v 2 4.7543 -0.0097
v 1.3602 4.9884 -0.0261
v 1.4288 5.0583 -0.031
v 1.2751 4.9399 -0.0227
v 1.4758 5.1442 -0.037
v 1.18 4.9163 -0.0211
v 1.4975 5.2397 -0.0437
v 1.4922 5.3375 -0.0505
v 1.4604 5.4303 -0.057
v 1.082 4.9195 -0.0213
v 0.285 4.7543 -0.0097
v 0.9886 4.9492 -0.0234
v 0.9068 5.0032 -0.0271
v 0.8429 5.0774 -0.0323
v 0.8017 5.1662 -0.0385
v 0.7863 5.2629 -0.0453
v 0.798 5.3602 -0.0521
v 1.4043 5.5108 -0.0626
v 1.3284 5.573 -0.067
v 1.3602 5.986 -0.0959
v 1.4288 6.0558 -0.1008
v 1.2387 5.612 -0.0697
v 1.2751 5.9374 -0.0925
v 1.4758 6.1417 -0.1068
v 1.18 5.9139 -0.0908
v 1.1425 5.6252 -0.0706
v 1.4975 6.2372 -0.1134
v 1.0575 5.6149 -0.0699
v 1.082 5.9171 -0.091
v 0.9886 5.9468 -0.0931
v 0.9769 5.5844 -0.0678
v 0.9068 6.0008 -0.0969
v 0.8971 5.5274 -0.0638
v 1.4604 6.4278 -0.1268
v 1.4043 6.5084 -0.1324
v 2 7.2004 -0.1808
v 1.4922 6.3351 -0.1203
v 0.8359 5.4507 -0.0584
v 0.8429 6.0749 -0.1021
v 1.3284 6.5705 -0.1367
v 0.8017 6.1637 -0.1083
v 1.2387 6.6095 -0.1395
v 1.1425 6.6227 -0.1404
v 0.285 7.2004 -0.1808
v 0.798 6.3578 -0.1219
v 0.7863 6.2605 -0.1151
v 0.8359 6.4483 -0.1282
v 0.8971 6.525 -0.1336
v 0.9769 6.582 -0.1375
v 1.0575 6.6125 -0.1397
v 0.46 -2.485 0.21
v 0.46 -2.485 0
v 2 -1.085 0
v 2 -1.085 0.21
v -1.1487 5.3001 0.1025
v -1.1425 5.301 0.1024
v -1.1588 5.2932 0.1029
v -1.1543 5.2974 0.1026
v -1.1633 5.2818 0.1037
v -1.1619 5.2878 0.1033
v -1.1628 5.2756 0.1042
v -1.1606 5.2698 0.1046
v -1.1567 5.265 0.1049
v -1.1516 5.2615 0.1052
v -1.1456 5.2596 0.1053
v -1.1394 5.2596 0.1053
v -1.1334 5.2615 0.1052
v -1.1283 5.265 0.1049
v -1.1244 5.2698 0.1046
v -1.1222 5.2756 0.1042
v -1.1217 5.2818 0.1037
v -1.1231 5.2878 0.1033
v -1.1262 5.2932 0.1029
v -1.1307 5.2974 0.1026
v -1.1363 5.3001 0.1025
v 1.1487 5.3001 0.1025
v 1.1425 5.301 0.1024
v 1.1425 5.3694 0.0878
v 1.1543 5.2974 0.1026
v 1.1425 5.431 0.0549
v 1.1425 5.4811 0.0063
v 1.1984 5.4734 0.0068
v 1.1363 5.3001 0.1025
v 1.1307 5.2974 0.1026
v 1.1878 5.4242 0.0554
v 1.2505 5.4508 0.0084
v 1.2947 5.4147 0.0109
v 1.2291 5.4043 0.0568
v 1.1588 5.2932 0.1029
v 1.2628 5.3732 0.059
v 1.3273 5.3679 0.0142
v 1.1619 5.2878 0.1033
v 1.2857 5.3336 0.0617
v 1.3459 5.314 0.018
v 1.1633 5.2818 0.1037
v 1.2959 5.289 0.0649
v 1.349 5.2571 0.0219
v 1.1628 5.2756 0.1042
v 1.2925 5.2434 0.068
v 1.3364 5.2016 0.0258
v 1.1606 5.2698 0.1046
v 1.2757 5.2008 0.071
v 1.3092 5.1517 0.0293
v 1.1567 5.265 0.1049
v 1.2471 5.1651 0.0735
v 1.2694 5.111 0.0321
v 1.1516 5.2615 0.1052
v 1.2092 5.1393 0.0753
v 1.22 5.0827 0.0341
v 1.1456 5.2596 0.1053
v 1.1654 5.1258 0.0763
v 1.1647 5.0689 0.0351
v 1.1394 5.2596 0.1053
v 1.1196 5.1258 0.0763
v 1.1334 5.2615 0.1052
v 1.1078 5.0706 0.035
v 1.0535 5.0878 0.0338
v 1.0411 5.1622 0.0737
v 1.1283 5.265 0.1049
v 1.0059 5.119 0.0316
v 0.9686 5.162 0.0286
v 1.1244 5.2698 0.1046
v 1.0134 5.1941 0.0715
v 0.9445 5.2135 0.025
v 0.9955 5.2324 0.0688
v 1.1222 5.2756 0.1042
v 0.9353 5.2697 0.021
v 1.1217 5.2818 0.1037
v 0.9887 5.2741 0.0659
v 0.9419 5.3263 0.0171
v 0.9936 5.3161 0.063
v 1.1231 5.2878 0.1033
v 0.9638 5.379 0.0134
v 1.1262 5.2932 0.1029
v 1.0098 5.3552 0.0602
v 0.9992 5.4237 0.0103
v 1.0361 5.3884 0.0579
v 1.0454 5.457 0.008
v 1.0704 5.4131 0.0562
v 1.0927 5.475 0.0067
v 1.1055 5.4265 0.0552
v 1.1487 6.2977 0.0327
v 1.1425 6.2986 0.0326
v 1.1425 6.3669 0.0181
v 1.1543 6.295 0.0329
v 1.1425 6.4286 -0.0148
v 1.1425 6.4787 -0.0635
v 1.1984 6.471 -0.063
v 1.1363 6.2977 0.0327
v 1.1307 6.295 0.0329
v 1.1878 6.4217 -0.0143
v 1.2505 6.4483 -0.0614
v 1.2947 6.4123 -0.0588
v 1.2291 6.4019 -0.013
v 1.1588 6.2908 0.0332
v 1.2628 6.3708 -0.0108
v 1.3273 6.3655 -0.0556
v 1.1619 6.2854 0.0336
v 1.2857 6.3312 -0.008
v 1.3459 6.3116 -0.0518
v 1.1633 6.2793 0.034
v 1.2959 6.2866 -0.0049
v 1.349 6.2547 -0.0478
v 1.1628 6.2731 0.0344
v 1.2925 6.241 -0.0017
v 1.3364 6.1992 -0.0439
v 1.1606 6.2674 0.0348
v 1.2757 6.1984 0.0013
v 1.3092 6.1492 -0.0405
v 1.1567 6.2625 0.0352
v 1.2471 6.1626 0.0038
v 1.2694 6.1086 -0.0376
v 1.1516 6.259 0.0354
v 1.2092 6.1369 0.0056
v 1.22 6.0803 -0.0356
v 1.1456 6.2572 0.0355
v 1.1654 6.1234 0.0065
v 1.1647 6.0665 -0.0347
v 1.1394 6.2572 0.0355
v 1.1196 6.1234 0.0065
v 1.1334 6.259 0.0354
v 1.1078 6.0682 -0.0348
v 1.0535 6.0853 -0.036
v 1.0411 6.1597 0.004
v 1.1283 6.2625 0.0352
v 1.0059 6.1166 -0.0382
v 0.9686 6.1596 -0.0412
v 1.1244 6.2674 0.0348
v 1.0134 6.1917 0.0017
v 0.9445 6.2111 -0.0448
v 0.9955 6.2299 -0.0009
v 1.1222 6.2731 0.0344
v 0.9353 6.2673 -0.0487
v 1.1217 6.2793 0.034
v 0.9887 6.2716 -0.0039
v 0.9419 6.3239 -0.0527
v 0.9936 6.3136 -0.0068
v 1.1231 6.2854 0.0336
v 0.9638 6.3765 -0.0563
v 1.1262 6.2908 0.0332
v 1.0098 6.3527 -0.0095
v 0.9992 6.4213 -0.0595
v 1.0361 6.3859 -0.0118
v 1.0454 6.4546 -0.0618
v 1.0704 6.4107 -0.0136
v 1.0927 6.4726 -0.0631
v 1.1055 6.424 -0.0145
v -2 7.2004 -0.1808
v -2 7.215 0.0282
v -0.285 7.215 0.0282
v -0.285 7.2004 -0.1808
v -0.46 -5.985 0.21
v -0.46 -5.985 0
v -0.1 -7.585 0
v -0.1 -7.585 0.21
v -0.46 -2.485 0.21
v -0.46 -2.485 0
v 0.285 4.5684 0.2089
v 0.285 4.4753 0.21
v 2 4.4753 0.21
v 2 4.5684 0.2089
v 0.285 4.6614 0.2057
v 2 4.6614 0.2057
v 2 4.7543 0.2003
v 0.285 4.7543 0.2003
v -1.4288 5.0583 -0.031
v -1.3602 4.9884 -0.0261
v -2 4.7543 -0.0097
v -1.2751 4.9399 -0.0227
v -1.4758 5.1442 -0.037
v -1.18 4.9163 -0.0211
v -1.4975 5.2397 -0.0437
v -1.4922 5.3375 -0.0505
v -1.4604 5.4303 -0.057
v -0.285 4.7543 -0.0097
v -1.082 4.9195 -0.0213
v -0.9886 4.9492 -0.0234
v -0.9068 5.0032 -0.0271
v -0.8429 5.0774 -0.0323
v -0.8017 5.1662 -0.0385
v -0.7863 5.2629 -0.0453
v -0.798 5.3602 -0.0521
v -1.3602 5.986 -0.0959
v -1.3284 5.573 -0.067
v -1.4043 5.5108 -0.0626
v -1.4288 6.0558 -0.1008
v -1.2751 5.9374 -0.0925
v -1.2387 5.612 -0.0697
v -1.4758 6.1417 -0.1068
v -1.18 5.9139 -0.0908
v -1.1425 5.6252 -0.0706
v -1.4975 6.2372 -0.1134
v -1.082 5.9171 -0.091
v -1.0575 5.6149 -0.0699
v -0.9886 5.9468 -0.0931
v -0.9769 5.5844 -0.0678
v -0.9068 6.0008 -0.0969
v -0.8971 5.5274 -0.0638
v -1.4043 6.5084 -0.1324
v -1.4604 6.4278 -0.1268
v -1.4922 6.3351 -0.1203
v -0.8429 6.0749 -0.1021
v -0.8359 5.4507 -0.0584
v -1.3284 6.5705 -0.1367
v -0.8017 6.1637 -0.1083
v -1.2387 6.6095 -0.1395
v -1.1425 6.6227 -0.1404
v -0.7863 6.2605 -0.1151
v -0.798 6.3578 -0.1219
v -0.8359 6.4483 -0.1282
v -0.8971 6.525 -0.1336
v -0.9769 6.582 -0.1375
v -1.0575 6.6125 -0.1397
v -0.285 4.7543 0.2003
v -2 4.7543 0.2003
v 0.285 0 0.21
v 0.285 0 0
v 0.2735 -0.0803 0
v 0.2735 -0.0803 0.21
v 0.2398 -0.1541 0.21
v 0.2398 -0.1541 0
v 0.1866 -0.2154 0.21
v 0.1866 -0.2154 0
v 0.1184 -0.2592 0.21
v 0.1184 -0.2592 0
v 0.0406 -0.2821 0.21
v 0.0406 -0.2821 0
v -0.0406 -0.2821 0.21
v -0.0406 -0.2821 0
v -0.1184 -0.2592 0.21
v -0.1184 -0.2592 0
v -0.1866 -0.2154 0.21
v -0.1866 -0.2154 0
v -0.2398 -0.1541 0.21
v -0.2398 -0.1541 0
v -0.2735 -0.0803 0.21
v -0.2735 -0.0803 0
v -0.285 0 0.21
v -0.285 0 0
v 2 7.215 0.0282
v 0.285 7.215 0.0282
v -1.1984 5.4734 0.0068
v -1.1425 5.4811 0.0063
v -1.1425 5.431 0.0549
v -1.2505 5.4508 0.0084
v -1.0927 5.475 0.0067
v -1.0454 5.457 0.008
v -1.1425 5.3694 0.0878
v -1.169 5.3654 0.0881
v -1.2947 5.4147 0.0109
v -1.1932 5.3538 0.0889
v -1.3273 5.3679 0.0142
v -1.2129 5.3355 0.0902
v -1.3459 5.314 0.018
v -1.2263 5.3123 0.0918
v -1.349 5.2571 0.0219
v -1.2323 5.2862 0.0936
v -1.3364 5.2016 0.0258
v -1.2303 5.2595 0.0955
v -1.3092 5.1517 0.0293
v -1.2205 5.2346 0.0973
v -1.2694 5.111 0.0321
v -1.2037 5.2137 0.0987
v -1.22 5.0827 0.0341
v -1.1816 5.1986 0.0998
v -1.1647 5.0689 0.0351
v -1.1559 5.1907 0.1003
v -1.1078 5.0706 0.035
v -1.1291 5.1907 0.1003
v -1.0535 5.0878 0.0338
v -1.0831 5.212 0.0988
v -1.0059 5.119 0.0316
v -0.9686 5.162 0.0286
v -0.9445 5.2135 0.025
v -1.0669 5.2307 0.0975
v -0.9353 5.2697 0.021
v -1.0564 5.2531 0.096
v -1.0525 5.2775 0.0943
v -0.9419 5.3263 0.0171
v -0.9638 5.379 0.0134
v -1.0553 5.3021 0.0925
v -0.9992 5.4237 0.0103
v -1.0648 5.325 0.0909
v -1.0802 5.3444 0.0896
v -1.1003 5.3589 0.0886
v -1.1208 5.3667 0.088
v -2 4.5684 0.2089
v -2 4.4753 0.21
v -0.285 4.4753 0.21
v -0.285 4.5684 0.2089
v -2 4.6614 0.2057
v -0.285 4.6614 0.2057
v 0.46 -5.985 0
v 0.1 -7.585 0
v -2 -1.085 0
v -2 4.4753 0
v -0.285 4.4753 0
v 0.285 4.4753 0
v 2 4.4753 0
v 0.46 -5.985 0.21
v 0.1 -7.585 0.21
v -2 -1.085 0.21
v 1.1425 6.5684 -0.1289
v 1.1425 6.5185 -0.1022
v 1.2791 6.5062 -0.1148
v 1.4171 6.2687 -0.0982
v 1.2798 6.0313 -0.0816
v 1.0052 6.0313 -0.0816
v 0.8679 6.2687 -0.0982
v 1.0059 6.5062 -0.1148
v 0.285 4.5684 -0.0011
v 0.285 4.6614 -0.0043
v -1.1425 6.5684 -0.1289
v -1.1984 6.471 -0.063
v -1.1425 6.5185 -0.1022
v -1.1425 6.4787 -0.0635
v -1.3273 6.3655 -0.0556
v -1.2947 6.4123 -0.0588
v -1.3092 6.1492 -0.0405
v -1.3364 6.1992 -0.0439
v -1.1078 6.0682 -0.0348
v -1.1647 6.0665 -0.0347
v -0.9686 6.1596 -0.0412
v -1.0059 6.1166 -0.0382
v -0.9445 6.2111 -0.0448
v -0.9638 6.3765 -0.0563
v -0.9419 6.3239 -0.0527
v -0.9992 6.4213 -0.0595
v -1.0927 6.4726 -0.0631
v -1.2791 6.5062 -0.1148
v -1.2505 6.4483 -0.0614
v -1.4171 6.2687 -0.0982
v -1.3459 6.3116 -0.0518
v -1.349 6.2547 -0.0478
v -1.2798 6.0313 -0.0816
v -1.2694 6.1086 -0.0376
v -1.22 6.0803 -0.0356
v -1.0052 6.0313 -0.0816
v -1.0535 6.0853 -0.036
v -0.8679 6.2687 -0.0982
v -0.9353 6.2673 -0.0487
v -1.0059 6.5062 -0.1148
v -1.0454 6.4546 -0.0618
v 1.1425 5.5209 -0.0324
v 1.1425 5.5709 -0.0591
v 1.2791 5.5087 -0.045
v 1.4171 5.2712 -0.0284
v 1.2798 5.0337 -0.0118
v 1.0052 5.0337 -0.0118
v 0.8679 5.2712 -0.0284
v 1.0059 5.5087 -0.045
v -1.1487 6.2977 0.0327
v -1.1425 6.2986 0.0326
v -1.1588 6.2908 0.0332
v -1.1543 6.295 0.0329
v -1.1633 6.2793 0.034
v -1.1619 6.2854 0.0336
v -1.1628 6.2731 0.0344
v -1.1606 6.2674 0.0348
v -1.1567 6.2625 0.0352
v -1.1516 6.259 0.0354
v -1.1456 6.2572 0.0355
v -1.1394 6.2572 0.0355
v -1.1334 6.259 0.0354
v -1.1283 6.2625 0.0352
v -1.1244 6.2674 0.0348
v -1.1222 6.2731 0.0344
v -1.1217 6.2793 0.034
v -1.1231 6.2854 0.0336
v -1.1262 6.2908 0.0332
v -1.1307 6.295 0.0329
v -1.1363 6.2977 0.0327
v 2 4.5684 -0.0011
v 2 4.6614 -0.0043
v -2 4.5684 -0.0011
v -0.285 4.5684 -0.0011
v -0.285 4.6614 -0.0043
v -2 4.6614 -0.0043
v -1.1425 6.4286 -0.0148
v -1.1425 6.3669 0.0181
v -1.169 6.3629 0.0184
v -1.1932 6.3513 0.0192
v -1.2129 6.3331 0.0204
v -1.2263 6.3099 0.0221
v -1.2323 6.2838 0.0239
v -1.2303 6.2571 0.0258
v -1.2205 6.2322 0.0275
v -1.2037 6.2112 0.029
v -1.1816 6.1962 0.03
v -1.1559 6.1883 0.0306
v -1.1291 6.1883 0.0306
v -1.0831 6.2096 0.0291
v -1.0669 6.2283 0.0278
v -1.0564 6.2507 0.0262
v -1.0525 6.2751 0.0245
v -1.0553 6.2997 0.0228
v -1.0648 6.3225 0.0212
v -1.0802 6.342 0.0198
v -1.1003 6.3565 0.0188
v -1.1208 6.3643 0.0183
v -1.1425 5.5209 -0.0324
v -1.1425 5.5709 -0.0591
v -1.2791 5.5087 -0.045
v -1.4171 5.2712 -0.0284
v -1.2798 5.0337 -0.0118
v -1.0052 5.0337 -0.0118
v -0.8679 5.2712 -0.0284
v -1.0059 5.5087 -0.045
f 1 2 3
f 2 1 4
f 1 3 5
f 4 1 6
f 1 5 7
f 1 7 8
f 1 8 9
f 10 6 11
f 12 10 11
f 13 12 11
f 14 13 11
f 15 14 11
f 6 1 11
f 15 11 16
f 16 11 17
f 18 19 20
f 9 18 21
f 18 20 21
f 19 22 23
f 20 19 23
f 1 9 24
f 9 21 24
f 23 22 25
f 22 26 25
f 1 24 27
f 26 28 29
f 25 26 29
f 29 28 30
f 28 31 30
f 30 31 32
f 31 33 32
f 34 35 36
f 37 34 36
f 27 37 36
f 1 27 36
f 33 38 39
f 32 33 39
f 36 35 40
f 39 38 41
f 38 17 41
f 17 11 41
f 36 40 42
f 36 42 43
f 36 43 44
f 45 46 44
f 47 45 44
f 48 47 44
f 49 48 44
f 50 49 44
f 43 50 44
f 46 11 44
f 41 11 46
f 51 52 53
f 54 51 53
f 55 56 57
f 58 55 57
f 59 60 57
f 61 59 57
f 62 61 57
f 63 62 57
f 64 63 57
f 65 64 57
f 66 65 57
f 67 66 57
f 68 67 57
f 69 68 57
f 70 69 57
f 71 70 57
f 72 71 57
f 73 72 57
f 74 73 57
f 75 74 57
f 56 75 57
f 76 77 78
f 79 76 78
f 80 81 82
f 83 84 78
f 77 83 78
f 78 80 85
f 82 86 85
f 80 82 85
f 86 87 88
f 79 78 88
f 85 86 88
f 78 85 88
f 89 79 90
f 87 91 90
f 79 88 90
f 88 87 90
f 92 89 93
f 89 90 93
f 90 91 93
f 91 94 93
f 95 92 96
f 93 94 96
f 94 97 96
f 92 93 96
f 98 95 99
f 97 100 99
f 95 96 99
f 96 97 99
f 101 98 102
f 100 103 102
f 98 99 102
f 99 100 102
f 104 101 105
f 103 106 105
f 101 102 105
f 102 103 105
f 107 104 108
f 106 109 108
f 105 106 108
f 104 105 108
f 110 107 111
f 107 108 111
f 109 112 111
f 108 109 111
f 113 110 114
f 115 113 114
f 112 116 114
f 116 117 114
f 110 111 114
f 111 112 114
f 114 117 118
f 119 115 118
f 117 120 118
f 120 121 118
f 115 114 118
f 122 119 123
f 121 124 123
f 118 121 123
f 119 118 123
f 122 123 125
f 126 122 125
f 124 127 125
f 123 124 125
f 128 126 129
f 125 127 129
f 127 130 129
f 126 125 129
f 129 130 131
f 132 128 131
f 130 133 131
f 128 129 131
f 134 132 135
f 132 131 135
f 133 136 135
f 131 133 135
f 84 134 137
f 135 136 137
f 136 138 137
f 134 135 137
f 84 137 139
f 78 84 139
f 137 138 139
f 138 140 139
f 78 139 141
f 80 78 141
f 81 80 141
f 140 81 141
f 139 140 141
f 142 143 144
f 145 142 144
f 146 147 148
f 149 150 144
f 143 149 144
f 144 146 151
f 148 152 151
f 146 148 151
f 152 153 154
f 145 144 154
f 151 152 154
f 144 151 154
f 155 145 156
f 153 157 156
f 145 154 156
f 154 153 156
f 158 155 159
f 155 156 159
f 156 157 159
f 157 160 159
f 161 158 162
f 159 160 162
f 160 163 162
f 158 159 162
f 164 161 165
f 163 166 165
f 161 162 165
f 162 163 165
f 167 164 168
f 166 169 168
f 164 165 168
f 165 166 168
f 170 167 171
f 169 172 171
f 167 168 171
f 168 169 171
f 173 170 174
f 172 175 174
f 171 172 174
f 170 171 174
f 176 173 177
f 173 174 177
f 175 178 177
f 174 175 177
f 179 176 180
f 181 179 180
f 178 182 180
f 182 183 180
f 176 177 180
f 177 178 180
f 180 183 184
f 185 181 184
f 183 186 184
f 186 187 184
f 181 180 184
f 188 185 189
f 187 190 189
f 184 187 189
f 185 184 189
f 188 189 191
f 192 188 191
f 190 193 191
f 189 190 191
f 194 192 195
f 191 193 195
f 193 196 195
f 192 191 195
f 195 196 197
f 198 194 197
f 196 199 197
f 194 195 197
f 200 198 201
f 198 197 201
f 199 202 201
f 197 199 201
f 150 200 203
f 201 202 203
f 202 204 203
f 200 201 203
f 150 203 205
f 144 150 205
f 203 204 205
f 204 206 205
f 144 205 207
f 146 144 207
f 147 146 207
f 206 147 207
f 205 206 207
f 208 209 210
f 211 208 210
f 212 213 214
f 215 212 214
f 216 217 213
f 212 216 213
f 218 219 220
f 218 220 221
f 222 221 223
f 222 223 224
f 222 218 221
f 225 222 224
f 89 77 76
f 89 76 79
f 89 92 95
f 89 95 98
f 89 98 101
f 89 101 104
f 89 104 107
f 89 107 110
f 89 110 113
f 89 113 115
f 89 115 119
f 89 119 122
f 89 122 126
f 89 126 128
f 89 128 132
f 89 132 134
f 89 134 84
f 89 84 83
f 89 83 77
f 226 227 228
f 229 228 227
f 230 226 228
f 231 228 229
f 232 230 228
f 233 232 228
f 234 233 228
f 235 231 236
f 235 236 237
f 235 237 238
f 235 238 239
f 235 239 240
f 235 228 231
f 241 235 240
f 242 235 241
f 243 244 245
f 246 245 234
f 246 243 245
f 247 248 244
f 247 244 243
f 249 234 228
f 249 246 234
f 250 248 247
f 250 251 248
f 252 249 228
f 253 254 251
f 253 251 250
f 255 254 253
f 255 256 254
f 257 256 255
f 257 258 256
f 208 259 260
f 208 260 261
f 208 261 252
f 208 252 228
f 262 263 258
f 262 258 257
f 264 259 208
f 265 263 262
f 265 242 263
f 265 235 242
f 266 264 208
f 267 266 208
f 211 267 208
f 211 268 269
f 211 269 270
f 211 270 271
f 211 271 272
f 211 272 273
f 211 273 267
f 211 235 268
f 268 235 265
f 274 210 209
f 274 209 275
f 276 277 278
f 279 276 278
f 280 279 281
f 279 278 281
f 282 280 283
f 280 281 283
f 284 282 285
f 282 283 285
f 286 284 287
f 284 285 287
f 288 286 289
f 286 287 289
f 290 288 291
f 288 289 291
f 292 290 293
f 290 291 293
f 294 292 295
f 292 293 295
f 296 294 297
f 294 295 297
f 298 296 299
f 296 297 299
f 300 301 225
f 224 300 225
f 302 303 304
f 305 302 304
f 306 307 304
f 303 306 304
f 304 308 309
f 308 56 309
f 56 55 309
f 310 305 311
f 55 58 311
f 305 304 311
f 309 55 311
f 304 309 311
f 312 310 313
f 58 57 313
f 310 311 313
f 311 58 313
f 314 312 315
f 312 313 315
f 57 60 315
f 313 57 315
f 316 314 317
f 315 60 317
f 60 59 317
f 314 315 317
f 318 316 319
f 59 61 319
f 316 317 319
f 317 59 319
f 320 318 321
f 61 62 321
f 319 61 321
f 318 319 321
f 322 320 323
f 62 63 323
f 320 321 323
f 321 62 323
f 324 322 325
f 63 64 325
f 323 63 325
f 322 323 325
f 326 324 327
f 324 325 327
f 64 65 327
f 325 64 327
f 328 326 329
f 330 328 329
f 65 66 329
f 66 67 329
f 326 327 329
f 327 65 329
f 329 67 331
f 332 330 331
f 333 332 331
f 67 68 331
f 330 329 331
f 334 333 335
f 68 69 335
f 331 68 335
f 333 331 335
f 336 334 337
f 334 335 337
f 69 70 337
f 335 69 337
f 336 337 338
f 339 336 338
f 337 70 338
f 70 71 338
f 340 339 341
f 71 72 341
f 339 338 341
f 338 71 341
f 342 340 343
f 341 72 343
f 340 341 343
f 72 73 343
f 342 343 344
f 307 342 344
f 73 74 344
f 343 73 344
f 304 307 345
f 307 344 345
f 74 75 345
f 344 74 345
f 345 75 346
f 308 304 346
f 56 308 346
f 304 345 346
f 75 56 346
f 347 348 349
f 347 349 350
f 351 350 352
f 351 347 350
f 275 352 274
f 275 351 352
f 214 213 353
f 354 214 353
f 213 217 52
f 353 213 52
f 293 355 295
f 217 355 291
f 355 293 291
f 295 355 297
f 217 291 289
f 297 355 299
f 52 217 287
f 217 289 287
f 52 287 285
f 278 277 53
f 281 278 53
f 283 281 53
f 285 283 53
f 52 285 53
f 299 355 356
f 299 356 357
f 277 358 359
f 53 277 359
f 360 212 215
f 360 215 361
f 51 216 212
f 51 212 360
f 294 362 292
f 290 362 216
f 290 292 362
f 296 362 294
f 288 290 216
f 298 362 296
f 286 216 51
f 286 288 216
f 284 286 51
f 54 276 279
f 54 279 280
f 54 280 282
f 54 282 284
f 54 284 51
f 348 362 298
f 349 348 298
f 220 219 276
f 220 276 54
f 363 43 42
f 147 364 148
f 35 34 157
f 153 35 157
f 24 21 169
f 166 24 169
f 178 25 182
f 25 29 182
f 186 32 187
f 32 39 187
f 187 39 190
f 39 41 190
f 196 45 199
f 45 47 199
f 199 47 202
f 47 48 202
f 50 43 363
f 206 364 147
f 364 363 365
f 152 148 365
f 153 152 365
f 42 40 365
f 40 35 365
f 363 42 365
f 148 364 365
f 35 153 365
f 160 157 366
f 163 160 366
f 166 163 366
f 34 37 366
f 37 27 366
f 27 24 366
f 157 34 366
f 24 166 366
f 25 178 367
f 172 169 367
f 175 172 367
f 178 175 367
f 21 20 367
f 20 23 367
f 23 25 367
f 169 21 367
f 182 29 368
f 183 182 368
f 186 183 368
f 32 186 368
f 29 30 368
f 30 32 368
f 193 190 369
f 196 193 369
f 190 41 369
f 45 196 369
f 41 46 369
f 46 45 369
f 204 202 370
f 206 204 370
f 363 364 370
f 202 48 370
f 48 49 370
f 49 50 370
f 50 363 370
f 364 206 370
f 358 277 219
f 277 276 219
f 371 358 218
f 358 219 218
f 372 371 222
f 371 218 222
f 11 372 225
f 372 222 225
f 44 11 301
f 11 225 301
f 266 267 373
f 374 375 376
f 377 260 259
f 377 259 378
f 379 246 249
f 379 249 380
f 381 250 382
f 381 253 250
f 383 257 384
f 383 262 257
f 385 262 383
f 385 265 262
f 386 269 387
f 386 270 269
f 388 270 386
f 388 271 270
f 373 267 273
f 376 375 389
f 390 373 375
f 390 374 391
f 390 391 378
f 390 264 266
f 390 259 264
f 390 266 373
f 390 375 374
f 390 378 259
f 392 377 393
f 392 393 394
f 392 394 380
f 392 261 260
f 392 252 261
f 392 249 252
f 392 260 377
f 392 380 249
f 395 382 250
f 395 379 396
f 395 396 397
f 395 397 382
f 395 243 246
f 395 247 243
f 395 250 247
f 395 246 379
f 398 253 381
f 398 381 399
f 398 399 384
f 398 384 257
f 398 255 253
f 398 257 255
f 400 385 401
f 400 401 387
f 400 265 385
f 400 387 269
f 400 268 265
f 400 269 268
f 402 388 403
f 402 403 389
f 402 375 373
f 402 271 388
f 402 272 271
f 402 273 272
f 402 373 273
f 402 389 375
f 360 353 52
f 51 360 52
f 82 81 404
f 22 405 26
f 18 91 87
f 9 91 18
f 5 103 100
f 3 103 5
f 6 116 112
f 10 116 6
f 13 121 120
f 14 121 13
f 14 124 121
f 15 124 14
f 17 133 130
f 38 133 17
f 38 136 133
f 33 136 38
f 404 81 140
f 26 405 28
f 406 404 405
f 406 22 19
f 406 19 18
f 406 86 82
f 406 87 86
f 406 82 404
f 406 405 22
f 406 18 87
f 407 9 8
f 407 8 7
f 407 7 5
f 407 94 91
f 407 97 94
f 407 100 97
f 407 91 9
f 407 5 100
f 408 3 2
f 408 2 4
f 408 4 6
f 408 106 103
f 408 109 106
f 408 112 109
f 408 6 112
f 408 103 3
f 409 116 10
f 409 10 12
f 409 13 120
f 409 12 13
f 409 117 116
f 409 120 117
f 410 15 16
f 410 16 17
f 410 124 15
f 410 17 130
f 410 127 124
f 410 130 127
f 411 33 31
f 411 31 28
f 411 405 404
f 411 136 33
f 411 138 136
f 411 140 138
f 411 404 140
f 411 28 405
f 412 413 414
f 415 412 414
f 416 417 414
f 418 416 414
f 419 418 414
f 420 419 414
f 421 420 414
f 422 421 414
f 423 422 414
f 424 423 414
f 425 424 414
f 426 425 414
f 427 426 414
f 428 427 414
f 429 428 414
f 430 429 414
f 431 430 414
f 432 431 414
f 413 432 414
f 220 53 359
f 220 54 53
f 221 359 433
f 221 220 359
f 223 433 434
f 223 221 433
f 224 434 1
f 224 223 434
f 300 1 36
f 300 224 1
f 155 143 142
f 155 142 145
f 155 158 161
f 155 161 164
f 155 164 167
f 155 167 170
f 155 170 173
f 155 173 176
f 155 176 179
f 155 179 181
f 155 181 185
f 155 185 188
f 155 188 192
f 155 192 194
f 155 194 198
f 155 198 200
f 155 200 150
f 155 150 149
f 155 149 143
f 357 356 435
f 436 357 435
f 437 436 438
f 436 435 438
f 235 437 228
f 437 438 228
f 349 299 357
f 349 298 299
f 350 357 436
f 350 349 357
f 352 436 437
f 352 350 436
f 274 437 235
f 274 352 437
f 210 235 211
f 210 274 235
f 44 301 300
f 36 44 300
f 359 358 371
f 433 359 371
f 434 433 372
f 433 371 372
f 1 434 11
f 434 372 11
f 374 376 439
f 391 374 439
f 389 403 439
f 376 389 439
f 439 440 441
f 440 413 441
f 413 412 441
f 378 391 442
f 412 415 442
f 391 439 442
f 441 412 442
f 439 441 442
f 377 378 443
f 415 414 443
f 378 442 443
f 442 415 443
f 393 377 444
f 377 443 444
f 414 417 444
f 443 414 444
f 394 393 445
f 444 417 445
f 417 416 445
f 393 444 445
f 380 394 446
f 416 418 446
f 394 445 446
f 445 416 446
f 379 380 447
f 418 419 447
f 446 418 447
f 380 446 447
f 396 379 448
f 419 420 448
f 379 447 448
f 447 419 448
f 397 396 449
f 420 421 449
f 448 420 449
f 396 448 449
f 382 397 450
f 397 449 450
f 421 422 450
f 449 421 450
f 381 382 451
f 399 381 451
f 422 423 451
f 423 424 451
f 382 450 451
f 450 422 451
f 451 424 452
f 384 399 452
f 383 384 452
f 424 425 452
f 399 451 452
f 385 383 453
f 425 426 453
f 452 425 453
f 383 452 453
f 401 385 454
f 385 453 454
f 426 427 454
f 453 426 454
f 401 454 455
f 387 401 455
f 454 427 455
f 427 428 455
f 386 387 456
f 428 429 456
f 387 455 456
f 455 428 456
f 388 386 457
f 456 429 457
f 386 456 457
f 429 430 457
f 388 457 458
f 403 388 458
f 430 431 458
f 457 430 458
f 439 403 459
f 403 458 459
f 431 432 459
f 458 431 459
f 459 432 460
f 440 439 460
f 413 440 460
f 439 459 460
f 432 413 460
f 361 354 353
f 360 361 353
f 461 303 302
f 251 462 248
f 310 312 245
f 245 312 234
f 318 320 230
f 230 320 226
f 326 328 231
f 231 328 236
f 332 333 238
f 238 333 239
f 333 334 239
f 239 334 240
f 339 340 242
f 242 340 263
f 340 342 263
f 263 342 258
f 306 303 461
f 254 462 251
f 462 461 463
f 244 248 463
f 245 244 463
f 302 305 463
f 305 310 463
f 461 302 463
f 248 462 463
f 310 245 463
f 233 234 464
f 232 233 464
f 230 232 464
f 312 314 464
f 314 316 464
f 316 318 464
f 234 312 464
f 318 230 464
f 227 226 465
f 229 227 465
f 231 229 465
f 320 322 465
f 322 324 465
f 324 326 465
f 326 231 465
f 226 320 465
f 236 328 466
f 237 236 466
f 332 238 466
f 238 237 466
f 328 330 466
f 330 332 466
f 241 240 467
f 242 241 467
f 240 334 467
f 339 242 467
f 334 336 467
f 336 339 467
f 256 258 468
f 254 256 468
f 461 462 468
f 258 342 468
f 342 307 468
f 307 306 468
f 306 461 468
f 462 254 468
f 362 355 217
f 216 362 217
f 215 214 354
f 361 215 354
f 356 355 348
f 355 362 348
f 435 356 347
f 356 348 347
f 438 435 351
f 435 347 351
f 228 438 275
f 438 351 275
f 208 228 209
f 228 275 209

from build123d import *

# Parameters (mm, degrees)
BOSS_EXTRUDE1_DEPTH  = 0.21
SKETCH2_W            = 4
SKETCH2_H            = 0.21
CUT_EXTRUDE1_DEPTH   = 2.6
SWEEP1_START         = 0.285
SWEEP1_DEPTH         = 1.715
FILLET1_START        = -3
FILLET1_DEPTH        = 6
FILLET1_START_2      = -2
FILLET1_2_DEPTH      = 1.715
FILLET1_START_3      = 0.285
FILLET1_3_DEPTH      = 1.715
SKETCH4_R            = 0.25
CUT_EXTRUDE2_DEPTH   = 0.15
FILLET2_R            = 0.25
FILLET3_R            = 0.2
FILLET2_OF_MIRROR4_R = 0.25
FILLET3_OF_MIRROR4_R = 0.2
SKETCH6_W            = 4
SKETCH6_H            = 0.209488451
CUT_EXTRUDE5_DEPTH   = 15.914789915


with BuildPart() as part:
    # Sketch1 → Boss-Extrude1 (new body)
    with BuildSketch(Plane.XY):
        with BuildLine():
            Line((-0.285, 7.215), (-2, 7.215))
            Line((-2, 7.215), (-2, -1.085))
            Line((-2, -1.085), (-0.46, -2.485))
            Line((-0.46, -2.485), (-0.46, -5.985))
            Line((-0.46, -5.985), (-0.1, -7.585))
            Line((-0.1, -7.585), (0.1, -7.585))
            Line((0.1, -7.585), (0.46, -5.985))
            Line((0.46, -5.985), (0.46, -2.485))
            Line((0.46, -2.485), (2, -1.085))
            Line((2, -1.085), (2, 7.215))
            Line((2, 7.215), (0.285, 7.215))
            Line((0.285, 7.215), (0.285, 0))
            ThreePointArc((0.285, 0), (0, -0.285), (-0.285, 0))
            Line((-0.285, 0), (-0.285, 7.215))
        make_face()
    extrude(amount=BOSS_EXTRUDE1_DEPTH)

    # Sketch2 → Cut-Extrude1 (cut)
    with BuildSketch(Plane(origin=(0, 7.215, 0), x_dir=(1, 0, 0), z_dir=(0, 1, 0))):
        with Locations((0, -0.105)):
            Rectangle(SKETCH2_W, SKETCH2_H)
    extrude(amount=-CUT_EXTRUDE1_DEPTH, mode=Mode.SUBTRACT)

    # Sweep1: read off the stored shape, not the designer's step
    # Sweep1 outline → Sweep1 (add)
    with BuildSketch(Plane.YZ.offset(SWEEP1_START)):
        Polygon((4.615, 0), (7.215, -0.181809711), (7.215, 0.028190289), (4.615, 0.21), align=None)
    extrude(amount=SWEEP1_DEPTH)

    # Mirror3: part across plane


with BuildPart() as part_1:
    add(part.part)
    add(part.part.mirror(Plane(origin=(0, 0, 0), x_dir=(0, 0, 1), z_dir=(1, 0, 0))))

    # Fillet1: read off the stored shape, not the designer's step
    # Fillet1 outline → Fillet1 (cut)
    with BuildSketch(Plane.YZ.offset(FILLET1_START)):
        with BuildLine():
            ThreePointArc((4.475316922, 0.21), (4.614914909, 0.207563308), (4.754342817, 0.200256201))
            Line((4.754342817, 0.200256201), (4.615, 0.21))
            Line((4.615, 0.21), (4.475316922, 0.21))
        make_face()
    extrude(amount=FILLET1_DEPTH, mode=Mode.SUBTRACT)

    # Fillet1 2 outline → Fillet1 2 (add)
    with BuildSketch(Plane.YZ.offset(FILLET1_START_2)):
        with BuildLine():
            Line((4.615, 0), (4.475316922, 0))
            ThreePointArc((4.475316922, 0), (4.614914909, -0.002436692), (4.754342817, -0.009743799))
            Line((4.754342817, -0.009743799), (4.615, 0))
        make_face()
    extrude(amount=FILLET1_2_DEPTH)

    # Fillet1 3 outline → Fillet1 3 (add)
    with BuildSketch(Plane.YZ.offset(FILLET1_START_3)):
        with BuildLine():
            Line((4.615, 0), (4.475316922, 0))
            ThreePointArc((4.475316922, 0), (4.614914909, -0.002436692), (4.754342817, -0.009743799))
            Line((4.754342817, -0.009743799), (4.615, 0))
        make_face()
    extrude(amount=FILLET1_3_DEPTH)

    # Sketch4 → Cut-Extrude2 (cut)
    with BuildSketch(Plane(origin=(0, 0.022456431, 0.32114193), x_dir=(-1, 0, 0), z_dir=(0, -0.06975647374412543, -0.9975640502598243))):
        with Locations(Location((-1.1425, 6.260107027, 0), (0, 0, 90))):
            Circle(SKETCH4_R)
        with Locations(Location((-1.1425, 5.260107027, 0), (0, 0, 90))):
            Circle(SKETCH4_R)
    cut_extrude2 = extrude(amount=-CUT_EXTRUDE2_DEPTH, mode=Mode.SUBTRACT)

    # Fillet2
    # the kernel refuses this fillet: 0.25 mm, written as the material it adds along each edge
    with BuildSketch(Plane(origin=(1.1425, 6.277777623, 0.034093547), x_dir=(0, 0.9975640502598242, -0.06975647374412533), z_dir=(-1, 0, 0))) as fillet2_piece_1:
        with BuildLine():
            CenterArc((0.020871215, 0.25), FILLET2_R, 270, 66.421821522)
            Line((0.020871215, 0), (0.020871215, -0.005))
            Line((0.020871215, -0.005), (0.25, -0.005))
            Line((0.25, -0.005), (0.255, 0))
            ThreePointArc((0.255, 0), (0.255, 0.075), (0.254582576, 0.148))
            Line((0.254582576, 0.148), (0.25, 0.15))
        make_face()
    revolve(axis=Axis((1.1425, 6.277777623, 0.034093547), (0, -0.06975647374412543, -0.9975640502598243)))
    with BuildSketch(Plane(origin=(1.1425, 5.280213573, 0.10385002), x_dir=(0, 0.9975640502598242, -0.06975647374412533), z_dir=(-1, 0, 0))) as fillet2_piece_2:
        with BuildLine():
            CenterArc((0.020871215, 0.25), FILLET2_R, 270, 66.421821522)
            Line((0.020871215, 0), (0.020871215, -0.005))
            Line((0.020871215, -0.005), (0.25, -0.005))
            Line((0.25, -0.005), (0.255, 0))
            ThreePointArc((0.255, 0), (0.255, 0.075), (0.254582576, 0.148))
            Line((0.254582576, 0.148), (0.25, 0.15))
        make_face()
    revolve(axis=Axis((1.1425, 5.280213573, 0.10385002), (0, -0.06975647374412543, -0.9975640502598243)))

    # Fillet3
    fillet3_edges = [part_1.edges().sort_by_distance(p)[0] for p in [
        (1.1425, 6.01792314, -0.098101943),
        (1.1425, 5.020359089, -0.028345469),
    ]]
    fillet(fillet3_edges, radius=FILLET3_R)

    # Mirror4: Cut-Extrude2 across plane
    add(cut_extrude2.mirror(Plane(origin=(0, 0, 0), x_dir=(0, 0, 1), z_dir=(1, 0, 0))), mode=Mode.SUBTRACT)

    # Fillet2 of Mirror4
    # the kernel refuses this fillet: 0.25 mm, written as the material it adds along each edge
    with BuildSketch(Plane(origin=(-1.1425, 6.277777623, 0.034093547), x_dir=(0, 0.9975640502598242, -0.06975647374412533), z_dir=(1, 0, 0))) as fillet2_of_mirror4_piece_1:
        with BuildLine():
            CenterArc((0.020871215, -0.25), FILLET2_OF_MIRROR4_R, 23.578178478, 66.421821522)
            Line((0.020871215, 0), (0.020871215, 0.005))
            Line((0.020871215, 0.005), (0.25, 0.005))
            Line((0.25, 0.005), (0.255, 0))
            ThreePointArc((0.255, 0), (0.255, -0.075), (0.254582576, -0.148))
            Line((0.254582576, -0.148), (0.25, -0.15))
        make_face()
    revolve(axis=Axis((-1.1425, 6.277777623, 0.034093547), (0, 0.06975647374412543, 0.9975640502598243)))
    with BuildSketch(Plane(origin=(-1.1425, 5.280213573, 0.10385002), x_dir=(0, 0.9975640502598242, -0.06975647374412533), z_dir=(1, 0, 0))) as fillet2_of_mirror4_piece_2:
        with BuildLine():
            CenterArc((0.020871215, -0.25), FILLET2_OF_MIRROR4_R, 23.578178478, 66.421821522)
            Line((0.020871215, 0), (0.020871215, 0.005))
            Line((0.020871215, 0.005), (0.25, 0.005))
            Line((0.25, 0.005), (0.255, 0))
            ThreePointArc((0.255, 0), (0.255, -0.075), (0.254582576, -0.148))
            Line((0.254582576, -0.148), (0.25, -0.15))
        make_face()
    revolve(axis=Axis((-1.1425, 5.280213573, 0.10385002), (0, 0.06975647374412543, 0.9975640502598243)))

    # Fillet3 of Mirror4
    fillet3_of_mirror4_edges = [part_1.edges().sort_by_distance(p)[0] for p in [
        (-1.1425, 6.01792314, -0.098101943),
        (-1.1425, 5.020359089, -0.028345469),
    ]]
    fillet(fillet3_of_mirror4_edges, radius=FILLET3_OF_MIRROR4_R)

    # Sketch6 → Cut-Extrude5 (cut, through all)
    with BuildSketch(Plane(origin=(0, 7.177930393, -0.501929789), x_dir=(1, 0, 0), z_dir=(-1.513554906801369e-15, -0.9975640502598243, 0.06975647374412539))):
        with Locations((0, 0.426670352)):
            Rectangle(SKETCH6_W, SKETCH6_H)
    extrude(amount=-CUT_EXTRUDE5_DEPTH, mode=Mode.SUBTRACT)


solid = part_1.part
